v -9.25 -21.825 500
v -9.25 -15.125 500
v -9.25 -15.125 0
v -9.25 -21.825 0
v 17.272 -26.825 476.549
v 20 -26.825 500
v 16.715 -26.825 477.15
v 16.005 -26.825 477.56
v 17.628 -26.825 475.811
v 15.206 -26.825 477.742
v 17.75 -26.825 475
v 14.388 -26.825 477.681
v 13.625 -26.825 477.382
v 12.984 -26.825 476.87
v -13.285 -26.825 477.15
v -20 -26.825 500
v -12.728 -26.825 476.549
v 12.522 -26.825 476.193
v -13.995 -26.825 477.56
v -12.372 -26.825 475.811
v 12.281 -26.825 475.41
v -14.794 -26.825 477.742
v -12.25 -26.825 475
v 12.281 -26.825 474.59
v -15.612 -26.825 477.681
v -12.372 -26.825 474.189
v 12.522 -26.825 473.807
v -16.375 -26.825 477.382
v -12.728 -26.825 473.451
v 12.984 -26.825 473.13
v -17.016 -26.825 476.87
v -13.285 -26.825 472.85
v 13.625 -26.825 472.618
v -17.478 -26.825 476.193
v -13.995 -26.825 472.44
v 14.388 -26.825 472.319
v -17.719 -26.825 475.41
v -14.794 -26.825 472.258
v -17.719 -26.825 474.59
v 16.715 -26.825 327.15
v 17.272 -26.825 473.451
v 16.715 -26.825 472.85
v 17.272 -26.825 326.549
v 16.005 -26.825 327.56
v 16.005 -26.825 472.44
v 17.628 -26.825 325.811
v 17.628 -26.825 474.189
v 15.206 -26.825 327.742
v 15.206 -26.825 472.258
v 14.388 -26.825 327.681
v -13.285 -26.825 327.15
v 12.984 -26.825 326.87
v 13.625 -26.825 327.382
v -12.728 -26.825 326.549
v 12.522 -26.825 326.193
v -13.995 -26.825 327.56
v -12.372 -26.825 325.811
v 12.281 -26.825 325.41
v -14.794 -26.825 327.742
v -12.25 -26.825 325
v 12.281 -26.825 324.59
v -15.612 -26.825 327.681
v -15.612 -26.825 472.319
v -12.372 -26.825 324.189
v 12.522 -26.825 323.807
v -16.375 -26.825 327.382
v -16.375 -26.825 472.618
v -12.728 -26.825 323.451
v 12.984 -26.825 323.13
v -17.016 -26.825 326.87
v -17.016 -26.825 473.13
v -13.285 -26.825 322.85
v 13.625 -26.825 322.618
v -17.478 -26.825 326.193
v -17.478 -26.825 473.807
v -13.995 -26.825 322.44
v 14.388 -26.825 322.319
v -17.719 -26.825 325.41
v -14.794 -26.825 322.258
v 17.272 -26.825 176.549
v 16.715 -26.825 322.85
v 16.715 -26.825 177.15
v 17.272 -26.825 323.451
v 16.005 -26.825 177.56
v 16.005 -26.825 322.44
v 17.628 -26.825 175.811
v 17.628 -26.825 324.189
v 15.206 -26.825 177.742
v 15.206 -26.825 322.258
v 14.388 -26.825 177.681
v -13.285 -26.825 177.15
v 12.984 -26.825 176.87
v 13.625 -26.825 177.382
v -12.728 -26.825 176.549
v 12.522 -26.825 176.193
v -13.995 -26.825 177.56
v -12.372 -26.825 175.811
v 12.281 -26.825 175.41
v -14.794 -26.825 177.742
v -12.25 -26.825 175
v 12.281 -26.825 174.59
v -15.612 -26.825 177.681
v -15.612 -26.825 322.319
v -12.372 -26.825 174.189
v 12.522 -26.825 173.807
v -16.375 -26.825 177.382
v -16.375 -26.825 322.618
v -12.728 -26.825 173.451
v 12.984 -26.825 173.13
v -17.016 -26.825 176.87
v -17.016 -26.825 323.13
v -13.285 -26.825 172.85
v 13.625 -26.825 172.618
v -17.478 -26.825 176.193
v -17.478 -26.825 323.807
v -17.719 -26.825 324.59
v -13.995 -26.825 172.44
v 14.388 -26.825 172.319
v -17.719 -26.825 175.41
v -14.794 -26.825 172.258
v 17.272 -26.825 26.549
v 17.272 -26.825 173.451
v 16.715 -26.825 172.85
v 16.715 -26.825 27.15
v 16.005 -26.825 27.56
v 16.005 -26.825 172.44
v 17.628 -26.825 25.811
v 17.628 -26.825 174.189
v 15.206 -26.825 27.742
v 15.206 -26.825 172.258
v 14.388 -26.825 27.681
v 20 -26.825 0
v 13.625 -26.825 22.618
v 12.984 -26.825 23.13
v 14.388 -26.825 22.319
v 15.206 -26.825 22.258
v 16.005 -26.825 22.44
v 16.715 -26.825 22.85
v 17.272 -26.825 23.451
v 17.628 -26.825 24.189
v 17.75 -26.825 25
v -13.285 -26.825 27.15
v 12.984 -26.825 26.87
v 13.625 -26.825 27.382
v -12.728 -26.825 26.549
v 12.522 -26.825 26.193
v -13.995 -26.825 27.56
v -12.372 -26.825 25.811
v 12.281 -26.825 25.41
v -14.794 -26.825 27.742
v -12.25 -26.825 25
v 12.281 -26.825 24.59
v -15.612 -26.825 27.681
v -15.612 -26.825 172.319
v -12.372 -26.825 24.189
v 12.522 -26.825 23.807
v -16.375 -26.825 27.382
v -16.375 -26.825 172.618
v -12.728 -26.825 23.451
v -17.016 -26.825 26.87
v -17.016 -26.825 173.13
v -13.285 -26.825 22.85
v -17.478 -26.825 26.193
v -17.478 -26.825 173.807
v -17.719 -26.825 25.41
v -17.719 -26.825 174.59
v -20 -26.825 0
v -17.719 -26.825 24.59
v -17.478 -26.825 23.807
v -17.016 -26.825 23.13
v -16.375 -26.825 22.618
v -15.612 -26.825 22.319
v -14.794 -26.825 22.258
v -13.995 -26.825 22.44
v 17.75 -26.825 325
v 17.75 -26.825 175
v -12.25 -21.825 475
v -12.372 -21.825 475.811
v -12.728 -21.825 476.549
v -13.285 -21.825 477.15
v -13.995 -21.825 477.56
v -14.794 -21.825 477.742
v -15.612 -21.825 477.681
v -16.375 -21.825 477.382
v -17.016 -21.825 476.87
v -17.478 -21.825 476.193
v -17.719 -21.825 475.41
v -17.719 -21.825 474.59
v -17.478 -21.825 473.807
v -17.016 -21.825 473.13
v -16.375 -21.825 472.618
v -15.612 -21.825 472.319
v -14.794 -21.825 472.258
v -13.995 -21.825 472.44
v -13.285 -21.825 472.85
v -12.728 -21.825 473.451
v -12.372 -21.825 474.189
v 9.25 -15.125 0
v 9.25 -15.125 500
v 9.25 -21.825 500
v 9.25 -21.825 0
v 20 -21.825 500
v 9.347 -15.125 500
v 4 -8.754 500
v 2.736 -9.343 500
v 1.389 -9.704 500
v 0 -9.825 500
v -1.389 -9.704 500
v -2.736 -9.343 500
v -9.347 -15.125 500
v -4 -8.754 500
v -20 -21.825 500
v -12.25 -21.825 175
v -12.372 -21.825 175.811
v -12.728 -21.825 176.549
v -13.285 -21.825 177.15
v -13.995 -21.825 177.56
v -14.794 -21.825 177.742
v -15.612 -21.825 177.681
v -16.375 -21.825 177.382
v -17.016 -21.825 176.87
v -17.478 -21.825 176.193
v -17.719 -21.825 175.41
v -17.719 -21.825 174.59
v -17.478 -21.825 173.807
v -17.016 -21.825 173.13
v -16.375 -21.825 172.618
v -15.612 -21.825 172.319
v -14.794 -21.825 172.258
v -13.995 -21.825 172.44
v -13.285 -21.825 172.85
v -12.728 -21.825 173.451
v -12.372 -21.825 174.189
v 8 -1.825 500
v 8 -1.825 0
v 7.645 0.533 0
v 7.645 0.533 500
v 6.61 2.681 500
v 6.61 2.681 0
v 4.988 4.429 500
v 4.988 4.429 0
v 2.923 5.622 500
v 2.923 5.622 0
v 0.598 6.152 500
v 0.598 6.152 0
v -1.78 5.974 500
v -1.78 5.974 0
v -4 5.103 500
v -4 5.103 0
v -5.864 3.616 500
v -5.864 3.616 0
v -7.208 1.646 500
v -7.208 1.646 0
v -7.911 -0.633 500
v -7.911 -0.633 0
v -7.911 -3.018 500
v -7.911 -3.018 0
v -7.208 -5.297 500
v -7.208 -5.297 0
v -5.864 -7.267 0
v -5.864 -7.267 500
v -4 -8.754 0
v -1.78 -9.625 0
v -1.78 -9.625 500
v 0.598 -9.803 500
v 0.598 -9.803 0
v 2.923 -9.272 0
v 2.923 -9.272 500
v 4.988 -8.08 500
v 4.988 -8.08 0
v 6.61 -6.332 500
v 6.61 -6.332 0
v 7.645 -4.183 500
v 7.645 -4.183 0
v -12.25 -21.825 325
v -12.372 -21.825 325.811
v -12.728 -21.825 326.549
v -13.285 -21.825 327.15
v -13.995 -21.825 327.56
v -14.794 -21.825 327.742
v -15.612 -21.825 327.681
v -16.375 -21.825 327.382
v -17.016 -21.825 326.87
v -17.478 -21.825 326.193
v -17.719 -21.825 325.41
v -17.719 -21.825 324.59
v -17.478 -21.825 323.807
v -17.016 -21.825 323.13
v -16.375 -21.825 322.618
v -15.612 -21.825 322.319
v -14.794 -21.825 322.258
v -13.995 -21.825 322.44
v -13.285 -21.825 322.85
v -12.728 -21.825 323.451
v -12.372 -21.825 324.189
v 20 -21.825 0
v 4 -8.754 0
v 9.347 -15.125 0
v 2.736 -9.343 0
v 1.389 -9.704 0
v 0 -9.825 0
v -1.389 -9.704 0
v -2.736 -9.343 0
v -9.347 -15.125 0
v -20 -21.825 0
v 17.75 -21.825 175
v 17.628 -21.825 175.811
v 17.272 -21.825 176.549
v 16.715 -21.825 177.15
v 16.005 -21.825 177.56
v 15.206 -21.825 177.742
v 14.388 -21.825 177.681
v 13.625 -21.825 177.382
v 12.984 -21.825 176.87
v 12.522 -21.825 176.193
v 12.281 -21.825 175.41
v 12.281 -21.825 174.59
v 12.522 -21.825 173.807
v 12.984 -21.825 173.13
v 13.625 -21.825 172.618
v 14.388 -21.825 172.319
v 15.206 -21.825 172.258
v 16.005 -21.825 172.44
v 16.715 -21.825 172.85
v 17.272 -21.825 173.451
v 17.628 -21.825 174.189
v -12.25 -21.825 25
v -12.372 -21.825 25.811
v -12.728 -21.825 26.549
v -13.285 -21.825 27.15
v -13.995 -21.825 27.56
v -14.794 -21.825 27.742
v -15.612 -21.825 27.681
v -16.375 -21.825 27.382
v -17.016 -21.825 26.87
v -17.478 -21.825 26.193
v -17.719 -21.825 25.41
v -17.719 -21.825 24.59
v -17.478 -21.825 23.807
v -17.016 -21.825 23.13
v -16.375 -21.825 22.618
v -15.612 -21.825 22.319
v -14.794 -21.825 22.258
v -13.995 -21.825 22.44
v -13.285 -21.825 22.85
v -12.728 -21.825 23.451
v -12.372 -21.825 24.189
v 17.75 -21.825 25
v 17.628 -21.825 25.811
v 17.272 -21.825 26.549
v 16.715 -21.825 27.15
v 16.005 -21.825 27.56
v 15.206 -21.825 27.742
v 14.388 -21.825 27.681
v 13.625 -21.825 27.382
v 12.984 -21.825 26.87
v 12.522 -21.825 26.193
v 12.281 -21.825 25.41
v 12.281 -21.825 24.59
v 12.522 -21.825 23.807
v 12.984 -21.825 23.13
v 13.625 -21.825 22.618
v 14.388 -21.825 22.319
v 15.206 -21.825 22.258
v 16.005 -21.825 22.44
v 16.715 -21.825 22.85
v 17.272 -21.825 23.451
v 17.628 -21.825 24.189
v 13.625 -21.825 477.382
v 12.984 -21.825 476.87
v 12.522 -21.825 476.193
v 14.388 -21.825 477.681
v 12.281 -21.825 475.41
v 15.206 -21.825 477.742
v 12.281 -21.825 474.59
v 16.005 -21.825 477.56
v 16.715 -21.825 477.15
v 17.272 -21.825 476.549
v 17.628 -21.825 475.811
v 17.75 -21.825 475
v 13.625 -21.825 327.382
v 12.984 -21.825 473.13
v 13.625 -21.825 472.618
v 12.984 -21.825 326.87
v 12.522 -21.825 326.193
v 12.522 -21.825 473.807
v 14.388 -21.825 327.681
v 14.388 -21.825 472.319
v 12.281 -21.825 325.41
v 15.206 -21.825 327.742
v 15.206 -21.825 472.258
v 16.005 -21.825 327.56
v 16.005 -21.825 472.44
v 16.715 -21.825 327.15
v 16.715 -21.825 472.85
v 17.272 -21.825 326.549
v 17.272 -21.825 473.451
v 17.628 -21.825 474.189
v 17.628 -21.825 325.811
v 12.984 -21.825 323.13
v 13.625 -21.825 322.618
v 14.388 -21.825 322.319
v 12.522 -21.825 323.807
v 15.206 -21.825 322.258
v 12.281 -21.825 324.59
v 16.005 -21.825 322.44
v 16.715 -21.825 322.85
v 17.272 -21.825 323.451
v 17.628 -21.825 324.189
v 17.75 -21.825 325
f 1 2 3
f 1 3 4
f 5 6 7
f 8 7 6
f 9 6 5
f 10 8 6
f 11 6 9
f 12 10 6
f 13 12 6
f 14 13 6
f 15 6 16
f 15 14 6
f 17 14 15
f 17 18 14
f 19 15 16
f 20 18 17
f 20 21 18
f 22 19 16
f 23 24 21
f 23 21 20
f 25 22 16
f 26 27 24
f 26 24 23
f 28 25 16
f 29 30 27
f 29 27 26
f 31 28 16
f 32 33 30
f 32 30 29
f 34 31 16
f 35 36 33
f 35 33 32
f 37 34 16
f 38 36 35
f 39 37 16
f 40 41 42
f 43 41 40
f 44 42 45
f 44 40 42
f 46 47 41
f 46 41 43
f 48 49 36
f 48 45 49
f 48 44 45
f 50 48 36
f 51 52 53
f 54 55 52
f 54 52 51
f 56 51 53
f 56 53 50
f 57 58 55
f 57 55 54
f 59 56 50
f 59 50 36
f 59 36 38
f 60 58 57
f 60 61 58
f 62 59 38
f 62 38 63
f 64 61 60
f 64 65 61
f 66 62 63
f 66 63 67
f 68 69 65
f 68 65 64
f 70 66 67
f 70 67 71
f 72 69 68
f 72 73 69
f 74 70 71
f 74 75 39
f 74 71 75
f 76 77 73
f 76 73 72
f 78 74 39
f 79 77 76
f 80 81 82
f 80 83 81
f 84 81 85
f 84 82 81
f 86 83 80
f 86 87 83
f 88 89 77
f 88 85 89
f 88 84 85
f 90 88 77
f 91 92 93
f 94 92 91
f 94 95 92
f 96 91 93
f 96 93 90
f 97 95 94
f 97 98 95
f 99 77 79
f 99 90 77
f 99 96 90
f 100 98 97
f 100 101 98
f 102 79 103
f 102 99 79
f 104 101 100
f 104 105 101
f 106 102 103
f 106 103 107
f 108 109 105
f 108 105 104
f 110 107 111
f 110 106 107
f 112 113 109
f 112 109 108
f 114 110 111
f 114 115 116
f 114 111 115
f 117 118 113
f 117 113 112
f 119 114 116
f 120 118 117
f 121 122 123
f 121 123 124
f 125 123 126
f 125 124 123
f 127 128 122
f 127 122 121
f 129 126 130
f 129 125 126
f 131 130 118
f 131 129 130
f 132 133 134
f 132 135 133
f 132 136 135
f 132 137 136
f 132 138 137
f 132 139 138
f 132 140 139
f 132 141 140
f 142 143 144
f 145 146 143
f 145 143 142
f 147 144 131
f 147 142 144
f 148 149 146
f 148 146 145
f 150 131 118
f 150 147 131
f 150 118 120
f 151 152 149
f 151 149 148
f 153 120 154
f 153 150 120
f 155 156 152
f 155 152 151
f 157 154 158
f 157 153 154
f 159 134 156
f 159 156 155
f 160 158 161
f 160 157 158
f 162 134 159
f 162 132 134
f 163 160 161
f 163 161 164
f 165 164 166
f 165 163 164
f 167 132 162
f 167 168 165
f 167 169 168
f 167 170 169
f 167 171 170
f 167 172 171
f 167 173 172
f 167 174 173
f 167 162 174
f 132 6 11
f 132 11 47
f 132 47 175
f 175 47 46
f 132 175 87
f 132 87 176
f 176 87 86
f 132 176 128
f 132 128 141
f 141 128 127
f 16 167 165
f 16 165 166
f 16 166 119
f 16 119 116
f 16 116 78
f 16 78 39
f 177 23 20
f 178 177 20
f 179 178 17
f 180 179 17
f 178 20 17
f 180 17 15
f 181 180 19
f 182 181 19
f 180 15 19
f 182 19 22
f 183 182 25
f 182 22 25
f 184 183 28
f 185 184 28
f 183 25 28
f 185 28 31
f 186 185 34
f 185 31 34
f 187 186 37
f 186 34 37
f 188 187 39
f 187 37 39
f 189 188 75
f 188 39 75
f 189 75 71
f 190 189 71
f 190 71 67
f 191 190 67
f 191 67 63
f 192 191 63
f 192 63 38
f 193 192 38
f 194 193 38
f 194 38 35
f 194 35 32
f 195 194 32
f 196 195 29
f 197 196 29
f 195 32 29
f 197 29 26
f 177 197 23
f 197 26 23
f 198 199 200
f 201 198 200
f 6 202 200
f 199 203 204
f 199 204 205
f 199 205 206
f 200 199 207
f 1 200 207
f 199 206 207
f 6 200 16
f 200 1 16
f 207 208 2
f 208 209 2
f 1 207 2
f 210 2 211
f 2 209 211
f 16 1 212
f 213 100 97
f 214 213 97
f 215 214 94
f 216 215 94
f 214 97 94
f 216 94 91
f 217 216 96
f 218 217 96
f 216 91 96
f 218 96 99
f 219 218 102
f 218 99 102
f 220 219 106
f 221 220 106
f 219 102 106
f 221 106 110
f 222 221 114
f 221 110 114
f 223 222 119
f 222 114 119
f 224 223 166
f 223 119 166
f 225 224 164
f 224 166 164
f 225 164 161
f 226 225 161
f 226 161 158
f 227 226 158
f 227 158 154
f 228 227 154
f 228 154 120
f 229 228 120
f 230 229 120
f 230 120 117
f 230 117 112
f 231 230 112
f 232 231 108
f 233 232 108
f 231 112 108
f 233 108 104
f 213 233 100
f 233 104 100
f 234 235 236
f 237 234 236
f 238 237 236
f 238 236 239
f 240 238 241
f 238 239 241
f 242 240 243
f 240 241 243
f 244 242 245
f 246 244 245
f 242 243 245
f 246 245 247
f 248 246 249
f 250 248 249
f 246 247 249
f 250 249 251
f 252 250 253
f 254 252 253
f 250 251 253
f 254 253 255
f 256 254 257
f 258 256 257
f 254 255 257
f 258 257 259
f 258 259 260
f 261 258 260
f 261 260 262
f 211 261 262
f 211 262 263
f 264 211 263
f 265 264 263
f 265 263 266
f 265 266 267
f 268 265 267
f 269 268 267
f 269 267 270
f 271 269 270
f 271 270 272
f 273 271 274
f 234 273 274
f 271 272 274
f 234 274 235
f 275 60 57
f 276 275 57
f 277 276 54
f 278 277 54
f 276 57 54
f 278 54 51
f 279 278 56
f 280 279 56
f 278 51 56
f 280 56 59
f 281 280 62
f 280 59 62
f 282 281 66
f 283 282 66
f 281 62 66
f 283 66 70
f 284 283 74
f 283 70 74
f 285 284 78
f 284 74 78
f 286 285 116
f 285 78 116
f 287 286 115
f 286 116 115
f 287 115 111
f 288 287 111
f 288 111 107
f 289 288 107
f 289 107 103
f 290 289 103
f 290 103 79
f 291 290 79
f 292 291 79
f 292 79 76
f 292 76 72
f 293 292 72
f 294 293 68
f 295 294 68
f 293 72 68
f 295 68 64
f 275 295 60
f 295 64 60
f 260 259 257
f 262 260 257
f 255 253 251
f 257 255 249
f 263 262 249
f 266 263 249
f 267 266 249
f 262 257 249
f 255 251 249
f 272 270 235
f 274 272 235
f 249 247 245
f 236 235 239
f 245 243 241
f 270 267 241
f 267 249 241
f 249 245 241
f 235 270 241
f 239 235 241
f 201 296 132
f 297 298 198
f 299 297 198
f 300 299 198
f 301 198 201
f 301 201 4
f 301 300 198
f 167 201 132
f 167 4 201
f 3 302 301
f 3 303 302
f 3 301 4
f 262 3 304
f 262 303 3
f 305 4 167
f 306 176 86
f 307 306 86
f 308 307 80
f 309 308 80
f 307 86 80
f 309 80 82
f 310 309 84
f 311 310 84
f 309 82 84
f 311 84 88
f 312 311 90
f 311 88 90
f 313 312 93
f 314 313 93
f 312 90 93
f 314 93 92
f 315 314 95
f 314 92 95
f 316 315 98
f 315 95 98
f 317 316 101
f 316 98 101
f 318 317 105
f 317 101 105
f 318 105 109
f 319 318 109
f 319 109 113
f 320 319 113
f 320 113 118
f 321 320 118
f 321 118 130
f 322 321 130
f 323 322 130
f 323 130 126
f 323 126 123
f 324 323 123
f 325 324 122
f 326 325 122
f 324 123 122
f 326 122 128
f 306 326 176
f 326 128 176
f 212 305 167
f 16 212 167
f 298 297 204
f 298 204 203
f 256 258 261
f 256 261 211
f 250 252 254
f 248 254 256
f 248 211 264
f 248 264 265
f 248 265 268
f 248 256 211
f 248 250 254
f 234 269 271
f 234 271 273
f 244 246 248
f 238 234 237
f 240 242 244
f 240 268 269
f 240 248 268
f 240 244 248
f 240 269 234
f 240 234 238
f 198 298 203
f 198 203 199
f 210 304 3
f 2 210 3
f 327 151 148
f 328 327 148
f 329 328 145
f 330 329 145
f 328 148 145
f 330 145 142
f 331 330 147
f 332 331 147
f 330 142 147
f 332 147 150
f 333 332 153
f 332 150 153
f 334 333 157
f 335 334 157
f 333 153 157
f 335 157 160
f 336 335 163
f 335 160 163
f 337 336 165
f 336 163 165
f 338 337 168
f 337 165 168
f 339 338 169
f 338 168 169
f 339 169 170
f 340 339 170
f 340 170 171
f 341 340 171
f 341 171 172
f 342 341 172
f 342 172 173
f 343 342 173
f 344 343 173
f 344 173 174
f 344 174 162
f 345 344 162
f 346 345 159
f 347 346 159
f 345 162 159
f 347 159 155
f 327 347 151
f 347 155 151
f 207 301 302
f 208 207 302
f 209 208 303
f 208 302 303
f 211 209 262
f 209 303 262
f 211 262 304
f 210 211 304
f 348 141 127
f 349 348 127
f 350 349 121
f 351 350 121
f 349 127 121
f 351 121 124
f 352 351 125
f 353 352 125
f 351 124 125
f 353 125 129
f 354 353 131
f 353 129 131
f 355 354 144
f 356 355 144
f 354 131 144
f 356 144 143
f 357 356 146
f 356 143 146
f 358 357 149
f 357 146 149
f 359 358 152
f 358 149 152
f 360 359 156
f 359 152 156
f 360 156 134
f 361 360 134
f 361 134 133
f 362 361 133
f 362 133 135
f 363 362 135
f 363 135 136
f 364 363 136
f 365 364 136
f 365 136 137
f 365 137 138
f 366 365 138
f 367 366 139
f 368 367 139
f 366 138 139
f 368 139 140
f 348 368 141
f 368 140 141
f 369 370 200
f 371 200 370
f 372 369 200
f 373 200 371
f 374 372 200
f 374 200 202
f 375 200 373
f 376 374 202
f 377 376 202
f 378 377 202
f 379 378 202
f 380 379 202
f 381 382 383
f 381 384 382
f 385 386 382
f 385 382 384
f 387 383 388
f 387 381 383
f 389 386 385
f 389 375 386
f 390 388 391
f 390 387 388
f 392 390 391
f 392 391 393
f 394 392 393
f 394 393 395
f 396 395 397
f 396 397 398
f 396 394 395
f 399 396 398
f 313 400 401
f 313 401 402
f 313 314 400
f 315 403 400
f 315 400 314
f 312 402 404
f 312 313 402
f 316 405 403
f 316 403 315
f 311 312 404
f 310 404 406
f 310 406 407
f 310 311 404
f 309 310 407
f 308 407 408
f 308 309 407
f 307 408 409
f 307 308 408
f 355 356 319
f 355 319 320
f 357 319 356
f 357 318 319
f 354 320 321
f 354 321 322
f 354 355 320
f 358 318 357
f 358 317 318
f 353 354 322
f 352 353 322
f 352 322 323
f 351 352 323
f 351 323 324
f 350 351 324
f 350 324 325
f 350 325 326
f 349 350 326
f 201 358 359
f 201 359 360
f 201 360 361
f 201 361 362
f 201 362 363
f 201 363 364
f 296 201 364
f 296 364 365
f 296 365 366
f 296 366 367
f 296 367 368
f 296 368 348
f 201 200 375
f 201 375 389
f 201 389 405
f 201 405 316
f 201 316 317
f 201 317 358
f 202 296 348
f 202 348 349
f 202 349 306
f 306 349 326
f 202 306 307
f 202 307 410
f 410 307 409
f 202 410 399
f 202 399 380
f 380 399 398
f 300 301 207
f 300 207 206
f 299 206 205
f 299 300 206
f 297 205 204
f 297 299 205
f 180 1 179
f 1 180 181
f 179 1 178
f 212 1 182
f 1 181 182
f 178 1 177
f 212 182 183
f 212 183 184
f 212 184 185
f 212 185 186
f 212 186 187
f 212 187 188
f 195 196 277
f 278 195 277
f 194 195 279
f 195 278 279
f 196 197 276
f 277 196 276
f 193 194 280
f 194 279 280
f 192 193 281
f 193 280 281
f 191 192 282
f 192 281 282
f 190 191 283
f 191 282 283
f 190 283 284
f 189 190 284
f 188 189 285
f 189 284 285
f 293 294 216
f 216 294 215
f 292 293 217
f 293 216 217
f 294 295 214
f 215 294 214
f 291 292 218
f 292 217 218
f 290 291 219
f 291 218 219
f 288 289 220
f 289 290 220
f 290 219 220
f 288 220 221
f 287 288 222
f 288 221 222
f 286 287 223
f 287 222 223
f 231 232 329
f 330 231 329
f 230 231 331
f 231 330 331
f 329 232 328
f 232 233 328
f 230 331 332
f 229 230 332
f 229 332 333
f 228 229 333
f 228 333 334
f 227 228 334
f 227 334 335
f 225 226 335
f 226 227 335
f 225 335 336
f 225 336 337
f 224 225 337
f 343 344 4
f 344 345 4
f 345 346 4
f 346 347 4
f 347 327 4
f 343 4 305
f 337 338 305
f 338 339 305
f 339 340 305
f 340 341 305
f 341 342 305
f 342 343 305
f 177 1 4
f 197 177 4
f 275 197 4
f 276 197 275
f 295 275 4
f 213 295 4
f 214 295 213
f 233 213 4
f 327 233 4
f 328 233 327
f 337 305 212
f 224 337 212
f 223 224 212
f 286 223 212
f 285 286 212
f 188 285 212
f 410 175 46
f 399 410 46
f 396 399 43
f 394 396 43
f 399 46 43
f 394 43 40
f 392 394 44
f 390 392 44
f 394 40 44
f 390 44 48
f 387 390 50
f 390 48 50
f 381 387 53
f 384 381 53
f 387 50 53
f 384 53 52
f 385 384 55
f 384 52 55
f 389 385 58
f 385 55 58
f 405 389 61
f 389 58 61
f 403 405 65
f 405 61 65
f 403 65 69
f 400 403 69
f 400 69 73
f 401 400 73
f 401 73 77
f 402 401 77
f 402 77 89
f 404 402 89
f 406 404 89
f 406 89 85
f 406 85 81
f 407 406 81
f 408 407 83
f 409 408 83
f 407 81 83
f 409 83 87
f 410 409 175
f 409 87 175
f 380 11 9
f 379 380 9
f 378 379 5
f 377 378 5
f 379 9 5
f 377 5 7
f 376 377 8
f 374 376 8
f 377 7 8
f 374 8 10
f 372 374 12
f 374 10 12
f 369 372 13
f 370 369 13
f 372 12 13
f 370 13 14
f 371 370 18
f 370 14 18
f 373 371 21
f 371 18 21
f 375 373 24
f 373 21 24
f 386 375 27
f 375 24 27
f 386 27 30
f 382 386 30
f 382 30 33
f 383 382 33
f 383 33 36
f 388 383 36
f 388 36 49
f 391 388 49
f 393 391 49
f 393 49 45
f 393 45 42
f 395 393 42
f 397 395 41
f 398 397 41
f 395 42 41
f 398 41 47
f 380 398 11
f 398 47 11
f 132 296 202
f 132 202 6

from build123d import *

# Parameters (mm, degrees)
SKETCH1_R          = 8
EXTRUDE1_DEPTH     = 500
EXTRUDE3_DEPTH     = 500
SKETCH8_R          = 2.75
CUT_EXTRUDE1_DEPTH = 5
LPATTERN1_COUNT    = 4
LPATTERN1_PITCH    = 150


with BuildPart() as part:
    # Sketch1 → Extrude1 (new body)
    with BuildSketch(Plane.XY):
        with Locations((0, -1.825456957)):
            Circle(SKETCH1_R)
    extrude(amount=EXTRUDE1_DEPTH)


with BuildPart() as body_2:
    # Sketch2 → Extrude3 (new body)
    with BuildSketch(Plane.XY):
        with BuildLine():
            Line((4, -8.753660187), (9.346572319, -15.125456957))
            Line((9.346572319, -15.125456957), (9.25, -15.125456957))
            Line((9.25, -15.125456957), (9.25, -21.825456957))
            Line((9.25, -21.825456957), (20, -21.825456957))
            Line((20, -21.825456957), (20, -26.825456957))
            Line((20, -26.825456957), (0, -26.825456957))
            Line((0, -26.825456957), (0, -9.825456957))
            ThreePointArc((0, -9.825456957), (2.070552361, -9.552863567), (4, -8.753660187))
        make_face()
    extrude(amount=EXTRUDE3_DEPTH)


with BuildPart() as body_3:
    # Mirror5: mirrored copy
    add(body_2.part.mirror(Plane(origin=(0, -26.825456957, 500), x_dir=(0, 0, 1), z_dir=(1, 0, 0))))

    # Combine1: union body 2
    add(body_2.part)

    # Sketch8 → Cut-Extrude1 (cut)
    with BuildSketch(Plane.XZ.offset(26.825456957)):
        with Locations((-15, 475)):
            Circle(SKETCH8_R)
        with Locations((15, 475)):
            Circle(SKETCH8_R)
    cut_extrude1 = extrude(amount=-CUT_EXTRUDE1_DEPTH, mode=Mode.SUBTRACT)

    # LPattern1: Cut-Extrude1 ×4
    with Locations(*[(0, 0, -i * LPATTERN1_PITCH) for i in range(1, LPATTERN1_COUNT)]):
        add(cut_extrude1, mode=Mode.SUBTRACT)


solid = Compound([part.part, body_3.part])
